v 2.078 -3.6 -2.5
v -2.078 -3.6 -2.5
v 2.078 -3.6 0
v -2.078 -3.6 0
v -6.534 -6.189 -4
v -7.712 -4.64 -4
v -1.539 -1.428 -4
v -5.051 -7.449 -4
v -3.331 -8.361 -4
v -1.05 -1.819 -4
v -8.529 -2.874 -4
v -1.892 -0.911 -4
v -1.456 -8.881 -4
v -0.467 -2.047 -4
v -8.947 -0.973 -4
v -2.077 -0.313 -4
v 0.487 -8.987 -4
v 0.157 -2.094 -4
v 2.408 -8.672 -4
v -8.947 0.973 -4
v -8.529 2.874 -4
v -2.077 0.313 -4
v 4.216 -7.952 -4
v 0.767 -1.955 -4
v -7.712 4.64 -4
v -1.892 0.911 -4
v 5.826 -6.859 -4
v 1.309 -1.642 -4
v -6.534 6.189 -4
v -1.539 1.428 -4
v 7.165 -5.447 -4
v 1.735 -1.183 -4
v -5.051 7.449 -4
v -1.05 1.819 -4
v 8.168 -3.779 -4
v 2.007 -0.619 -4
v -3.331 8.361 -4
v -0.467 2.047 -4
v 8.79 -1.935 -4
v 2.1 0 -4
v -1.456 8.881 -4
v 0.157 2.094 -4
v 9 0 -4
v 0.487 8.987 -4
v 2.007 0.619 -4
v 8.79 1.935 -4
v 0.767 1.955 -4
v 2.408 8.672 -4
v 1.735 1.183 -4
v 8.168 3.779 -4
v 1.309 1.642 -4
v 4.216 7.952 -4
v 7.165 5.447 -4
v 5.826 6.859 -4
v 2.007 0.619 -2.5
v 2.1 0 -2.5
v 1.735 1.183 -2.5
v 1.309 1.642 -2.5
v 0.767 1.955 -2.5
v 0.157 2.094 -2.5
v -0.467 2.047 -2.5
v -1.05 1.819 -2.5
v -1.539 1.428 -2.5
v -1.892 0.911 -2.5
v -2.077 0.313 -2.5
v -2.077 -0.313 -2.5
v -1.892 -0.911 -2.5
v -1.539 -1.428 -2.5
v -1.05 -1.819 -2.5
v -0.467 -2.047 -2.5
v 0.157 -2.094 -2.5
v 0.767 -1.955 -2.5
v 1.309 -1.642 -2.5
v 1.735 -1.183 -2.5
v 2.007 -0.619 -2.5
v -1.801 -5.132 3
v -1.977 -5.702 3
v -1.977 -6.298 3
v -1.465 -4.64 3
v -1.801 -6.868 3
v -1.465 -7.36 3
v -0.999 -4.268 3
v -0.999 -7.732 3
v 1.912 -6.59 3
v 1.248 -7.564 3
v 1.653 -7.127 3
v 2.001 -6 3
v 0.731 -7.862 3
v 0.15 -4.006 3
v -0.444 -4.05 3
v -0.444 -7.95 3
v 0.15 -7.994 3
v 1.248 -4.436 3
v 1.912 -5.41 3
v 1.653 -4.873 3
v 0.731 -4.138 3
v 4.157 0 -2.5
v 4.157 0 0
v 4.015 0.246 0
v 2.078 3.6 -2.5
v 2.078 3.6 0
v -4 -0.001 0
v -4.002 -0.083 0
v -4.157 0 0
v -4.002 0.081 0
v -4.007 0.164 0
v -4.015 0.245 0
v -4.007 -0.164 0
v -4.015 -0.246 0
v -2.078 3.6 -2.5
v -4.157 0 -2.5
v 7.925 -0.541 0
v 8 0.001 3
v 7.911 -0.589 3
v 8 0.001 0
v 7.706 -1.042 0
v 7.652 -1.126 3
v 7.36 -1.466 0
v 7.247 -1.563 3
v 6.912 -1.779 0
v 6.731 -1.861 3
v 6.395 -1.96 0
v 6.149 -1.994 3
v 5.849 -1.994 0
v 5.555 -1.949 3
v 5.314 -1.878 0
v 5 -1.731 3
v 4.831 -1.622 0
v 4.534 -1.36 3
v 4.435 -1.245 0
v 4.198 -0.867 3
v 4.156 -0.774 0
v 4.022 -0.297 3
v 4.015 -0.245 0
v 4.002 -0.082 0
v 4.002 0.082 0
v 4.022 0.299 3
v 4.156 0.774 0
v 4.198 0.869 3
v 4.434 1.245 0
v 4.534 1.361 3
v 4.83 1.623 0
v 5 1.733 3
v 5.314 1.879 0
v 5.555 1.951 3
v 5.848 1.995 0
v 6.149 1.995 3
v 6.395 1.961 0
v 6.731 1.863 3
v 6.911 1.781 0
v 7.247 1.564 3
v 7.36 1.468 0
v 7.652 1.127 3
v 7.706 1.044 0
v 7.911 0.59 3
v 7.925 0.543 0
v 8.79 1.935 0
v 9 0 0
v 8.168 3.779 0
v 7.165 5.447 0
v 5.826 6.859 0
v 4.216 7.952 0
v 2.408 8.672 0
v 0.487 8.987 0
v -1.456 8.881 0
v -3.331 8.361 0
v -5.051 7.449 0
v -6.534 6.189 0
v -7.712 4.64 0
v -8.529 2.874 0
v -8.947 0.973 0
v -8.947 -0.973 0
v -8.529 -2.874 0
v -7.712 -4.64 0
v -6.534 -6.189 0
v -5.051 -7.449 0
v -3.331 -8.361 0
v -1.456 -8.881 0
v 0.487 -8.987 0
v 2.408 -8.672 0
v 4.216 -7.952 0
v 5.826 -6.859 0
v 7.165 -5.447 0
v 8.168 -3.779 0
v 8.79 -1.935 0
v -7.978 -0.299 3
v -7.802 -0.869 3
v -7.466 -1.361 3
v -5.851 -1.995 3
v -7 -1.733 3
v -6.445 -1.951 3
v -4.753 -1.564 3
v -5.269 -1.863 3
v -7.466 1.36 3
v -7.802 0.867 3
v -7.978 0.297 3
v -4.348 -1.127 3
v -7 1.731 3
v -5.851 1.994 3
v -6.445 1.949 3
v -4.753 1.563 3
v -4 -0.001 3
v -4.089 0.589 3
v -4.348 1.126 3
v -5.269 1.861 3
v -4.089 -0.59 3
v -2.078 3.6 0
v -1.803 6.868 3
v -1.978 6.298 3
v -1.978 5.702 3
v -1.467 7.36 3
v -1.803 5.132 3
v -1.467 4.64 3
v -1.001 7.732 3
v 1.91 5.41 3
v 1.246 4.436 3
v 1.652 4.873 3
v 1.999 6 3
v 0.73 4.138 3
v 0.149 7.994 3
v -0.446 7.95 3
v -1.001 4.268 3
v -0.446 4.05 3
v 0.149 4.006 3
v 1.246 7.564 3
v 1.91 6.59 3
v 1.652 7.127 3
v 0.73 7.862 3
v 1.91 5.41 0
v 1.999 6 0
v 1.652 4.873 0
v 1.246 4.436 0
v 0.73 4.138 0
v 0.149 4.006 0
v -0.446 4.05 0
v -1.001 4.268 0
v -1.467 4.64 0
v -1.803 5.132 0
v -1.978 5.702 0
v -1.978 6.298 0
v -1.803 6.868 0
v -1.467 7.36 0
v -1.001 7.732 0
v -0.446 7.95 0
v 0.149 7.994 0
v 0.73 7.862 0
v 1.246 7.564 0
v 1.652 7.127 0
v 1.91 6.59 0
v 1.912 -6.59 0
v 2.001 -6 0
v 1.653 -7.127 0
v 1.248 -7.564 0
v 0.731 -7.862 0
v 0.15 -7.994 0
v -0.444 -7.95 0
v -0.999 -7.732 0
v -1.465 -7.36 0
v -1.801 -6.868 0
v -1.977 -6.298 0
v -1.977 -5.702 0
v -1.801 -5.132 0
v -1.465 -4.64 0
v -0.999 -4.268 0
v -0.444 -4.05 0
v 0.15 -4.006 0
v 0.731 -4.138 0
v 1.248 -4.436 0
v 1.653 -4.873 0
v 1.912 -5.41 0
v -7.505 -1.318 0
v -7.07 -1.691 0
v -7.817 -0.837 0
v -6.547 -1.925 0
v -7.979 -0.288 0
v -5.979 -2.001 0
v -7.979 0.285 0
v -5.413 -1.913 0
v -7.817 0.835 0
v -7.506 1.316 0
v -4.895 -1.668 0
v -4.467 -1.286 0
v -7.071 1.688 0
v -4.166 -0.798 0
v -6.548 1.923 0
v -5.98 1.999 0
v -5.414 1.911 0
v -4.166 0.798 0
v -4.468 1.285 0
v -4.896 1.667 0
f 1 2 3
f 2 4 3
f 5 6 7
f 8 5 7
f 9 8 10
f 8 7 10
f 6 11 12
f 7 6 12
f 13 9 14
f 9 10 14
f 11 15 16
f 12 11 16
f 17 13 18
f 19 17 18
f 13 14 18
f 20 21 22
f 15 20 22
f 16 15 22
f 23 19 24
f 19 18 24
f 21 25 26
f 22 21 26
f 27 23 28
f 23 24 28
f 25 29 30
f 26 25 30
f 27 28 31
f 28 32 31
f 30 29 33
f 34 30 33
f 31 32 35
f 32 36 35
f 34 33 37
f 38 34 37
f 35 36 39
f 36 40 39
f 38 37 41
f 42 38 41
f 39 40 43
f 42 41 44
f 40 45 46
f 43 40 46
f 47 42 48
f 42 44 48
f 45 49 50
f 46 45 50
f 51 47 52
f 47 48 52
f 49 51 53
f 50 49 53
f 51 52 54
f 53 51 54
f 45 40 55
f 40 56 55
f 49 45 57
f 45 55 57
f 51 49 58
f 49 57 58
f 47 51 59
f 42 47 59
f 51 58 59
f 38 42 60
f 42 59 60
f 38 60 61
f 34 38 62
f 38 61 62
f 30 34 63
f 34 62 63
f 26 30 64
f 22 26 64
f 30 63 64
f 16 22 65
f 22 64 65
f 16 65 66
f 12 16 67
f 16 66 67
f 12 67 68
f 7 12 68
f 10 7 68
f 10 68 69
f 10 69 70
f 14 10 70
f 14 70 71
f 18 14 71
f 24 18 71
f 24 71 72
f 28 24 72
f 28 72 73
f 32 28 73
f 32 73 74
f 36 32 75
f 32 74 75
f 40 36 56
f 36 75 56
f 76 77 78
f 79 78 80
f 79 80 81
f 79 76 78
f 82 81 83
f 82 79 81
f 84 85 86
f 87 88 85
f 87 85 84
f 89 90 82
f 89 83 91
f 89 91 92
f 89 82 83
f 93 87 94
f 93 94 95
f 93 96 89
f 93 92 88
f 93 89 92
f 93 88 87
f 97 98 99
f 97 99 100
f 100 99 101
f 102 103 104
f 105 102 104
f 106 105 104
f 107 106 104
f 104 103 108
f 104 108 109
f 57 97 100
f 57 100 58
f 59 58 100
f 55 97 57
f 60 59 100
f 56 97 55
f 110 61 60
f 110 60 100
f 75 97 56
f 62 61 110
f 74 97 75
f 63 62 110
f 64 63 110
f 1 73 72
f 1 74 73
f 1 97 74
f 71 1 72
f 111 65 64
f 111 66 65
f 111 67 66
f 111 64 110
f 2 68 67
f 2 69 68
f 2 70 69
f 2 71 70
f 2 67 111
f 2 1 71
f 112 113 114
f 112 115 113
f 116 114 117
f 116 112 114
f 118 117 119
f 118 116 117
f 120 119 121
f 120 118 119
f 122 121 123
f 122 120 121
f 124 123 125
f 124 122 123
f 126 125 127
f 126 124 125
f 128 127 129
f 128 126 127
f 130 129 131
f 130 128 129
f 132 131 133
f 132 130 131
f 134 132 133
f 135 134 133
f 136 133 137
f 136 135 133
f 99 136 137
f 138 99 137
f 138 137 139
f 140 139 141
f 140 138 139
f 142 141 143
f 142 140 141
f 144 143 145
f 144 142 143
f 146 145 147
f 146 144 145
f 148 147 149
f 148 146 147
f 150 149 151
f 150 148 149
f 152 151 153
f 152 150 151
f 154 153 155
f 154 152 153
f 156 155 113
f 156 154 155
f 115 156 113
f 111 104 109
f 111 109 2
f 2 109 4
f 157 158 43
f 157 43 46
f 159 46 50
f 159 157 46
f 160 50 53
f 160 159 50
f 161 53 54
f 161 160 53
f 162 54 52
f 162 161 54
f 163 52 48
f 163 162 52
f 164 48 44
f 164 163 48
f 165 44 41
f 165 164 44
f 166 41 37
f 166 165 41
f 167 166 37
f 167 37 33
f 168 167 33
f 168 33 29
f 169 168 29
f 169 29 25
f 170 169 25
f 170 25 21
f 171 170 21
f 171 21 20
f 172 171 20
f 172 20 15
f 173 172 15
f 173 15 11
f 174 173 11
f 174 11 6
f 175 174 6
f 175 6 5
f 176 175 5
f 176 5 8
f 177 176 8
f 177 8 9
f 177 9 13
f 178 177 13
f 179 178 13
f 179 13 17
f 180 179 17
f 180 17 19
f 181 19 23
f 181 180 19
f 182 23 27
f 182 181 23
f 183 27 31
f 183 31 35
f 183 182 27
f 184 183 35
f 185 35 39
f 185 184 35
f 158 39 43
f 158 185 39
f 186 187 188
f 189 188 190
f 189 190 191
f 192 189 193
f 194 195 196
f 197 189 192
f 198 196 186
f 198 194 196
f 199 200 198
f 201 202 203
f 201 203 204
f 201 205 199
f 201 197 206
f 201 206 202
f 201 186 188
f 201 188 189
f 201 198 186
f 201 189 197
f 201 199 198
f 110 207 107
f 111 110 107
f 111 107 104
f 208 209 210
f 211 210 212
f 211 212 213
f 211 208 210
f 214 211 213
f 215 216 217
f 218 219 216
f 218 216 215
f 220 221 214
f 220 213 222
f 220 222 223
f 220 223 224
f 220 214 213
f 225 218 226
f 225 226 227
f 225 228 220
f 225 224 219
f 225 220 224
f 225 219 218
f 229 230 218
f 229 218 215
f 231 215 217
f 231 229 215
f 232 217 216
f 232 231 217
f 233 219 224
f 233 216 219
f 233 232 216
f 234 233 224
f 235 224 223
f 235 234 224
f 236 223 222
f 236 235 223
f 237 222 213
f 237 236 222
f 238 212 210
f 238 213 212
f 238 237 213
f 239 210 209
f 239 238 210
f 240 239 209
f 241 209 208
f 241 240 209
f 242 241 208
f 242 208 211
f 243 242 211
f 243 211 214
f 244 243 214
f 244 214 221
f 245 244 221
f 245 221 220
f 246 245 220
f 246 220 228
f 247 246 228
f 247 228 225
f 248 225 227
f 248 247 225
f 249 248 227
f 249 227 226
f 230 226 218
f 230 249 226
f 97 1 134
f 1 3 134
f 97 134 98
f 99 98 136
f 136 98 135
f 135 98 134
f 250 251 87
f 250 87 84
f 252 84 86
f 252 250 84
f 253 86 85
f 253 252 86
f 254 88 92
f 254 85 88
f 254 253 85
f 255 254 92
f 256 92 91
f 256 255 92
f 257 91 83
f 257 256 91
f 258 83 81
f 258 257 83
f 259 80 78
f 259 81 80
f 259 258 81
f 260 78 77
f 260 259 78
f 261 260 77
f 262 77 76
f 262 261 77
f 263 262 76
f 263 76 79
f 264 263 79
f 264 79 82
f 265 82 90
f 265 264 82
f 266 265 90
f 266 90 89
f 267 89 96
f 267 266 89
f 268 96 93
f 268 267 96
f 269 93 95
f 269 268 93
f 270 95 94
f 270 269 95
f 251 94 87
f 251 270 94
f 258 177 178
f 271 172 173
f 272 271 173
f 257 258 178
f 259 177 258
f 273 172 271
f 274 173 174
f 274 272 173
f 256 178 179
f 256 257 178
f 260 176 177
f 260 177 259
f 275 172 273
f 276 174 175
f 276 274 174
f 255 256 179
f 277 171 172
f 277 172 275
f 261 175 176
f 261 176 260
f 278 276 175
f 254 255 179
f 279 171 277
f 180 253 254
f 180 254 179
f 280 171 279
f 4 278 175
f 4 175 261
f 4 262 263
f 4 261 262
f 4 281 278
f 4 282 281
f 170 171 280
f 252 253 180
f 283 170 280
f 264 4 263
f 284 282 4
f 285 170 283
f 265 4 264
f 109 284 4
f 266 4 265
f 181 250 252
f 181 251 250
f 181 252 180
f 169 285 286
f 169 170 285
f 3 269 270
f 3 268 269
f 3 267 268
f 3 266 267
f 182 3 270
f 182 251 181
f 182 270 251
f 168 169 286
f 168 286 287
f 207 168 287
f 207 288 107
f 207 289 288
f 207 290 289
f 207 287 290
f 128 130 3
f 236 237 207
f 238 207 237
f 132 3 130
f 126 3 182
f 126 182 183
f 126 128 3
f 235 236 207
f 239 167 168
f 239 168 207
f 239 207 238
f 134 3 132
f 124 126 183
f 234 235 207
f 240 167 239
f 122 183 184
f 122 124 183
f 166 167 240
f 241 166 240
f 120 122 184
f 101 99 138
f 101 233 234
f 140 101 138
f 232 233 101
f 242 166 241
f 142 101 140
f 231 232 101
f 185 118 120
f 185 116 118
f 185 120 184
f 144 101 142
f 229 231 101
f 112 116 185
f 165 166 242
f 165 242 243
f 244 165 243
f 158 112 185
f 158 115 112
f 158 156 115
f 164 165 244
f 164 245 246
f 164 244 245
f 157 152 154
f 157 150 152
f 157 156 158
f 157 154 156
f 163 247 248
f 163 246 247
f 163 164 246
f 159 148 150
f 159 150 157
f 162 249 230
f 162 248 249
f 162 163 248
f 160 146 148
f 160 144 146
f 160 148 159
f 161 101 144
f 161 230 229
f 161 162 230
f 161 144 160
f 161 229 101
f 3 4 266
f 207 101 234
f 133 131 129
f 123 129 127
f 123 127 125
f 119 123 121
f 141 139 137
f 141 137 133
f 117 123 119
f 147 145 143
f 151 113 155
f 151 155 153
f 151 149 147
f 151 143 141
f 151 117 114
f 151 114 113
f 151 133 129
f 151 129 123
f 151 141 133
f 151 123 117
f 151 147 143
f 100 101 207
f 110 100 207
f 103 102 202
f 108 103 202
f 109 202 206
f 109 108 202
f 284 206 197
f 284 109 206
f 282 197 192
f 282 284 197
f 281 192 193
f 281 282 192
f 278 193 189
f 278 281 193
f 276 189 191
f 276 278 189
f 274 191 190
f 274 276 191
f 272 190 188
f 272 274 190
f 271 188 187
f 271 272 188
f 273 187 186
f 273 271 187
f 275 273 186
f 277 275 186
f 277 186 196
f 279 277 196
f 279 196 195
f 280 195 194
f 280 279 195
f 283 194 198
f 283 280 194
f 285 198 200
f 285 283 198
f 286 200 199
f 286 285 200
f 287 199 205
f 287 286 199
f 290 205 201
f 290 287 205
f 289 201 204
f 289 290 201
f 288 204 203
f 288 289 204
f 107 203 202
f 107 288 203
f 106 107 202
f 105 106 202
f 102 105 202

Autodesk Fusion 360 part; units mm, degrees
sketch "Sketch1" plane through (0, 0, 0) normal (0, 0, 1) x (1, 0, 0)
  circle A0 centre (0, 0) radius 9
  circle A1 centre (0, 0) radius 6 construction
  circle A2 centre (-0.0008, 6) radius 2
  circle A3 centre (-6, -0.0008) radius 2
  circle A4 centre (0.0008, -6) radius 2
  circle A5 centre (6, 0.0008) radius 2
  circle A6 centre (0, 0) radius 2.1
  dimension "d1" = 18
  dimension "d2" = 12
  dimension "d3" = 4
  dimension "d5" = 360
  dimension "d25" = 4.2
extrude "Extrude1" add sketch "Sketch1" against normal blind 4 contours A0 | A2 | A3 | A4 | A5
extrude "Extrude2" add sketch "Sketch1" along normal blind 3 contours A2 | A3 | A4 | A5
sketch "Sketch7" plane through (0, 0, 0) normal (0, 0, 1) x (-1, 0, 0)
  circle A0 centre (-6, -0.0008) radius 2
  circle A1 centre (6, 0.0008) radius 2
  circle A2 centre (0.0008, -6) radius 2
  circle A3 centre (-0.0008, 6) radius 2
  circle A4 centre (0, 0) radius 2.1
  circle A5 centre (0, 0) radius 9
  line L0 (-4.1569, 0) -> (-2.0785, -3.6)
  line L1 (-2.0785, -3.6) -> (2.0785, -3.6)
  line L2 (2.0785, -3.6) -> (4.1569, 0)
  line L3 (4.1569, 0) -> (2.0785, 3.6)
  line L4 (2.0785, 3.6) -> (-2.0785, 3.6)
  line L5 (-2.0785, 3.6) -> (-4.1569, 0)
  dimension "d26" = 7.2
extrude "Extrude8" cut sketch "Sketch7" against normal blind 2.5 contours A0 L0 L5 | A0 A1 L0 L1 L2 L3 L4 L5 | A1 L2 L3 picked at (-4.0529, 0.0269) picked at (4.0534, 0.0001)
